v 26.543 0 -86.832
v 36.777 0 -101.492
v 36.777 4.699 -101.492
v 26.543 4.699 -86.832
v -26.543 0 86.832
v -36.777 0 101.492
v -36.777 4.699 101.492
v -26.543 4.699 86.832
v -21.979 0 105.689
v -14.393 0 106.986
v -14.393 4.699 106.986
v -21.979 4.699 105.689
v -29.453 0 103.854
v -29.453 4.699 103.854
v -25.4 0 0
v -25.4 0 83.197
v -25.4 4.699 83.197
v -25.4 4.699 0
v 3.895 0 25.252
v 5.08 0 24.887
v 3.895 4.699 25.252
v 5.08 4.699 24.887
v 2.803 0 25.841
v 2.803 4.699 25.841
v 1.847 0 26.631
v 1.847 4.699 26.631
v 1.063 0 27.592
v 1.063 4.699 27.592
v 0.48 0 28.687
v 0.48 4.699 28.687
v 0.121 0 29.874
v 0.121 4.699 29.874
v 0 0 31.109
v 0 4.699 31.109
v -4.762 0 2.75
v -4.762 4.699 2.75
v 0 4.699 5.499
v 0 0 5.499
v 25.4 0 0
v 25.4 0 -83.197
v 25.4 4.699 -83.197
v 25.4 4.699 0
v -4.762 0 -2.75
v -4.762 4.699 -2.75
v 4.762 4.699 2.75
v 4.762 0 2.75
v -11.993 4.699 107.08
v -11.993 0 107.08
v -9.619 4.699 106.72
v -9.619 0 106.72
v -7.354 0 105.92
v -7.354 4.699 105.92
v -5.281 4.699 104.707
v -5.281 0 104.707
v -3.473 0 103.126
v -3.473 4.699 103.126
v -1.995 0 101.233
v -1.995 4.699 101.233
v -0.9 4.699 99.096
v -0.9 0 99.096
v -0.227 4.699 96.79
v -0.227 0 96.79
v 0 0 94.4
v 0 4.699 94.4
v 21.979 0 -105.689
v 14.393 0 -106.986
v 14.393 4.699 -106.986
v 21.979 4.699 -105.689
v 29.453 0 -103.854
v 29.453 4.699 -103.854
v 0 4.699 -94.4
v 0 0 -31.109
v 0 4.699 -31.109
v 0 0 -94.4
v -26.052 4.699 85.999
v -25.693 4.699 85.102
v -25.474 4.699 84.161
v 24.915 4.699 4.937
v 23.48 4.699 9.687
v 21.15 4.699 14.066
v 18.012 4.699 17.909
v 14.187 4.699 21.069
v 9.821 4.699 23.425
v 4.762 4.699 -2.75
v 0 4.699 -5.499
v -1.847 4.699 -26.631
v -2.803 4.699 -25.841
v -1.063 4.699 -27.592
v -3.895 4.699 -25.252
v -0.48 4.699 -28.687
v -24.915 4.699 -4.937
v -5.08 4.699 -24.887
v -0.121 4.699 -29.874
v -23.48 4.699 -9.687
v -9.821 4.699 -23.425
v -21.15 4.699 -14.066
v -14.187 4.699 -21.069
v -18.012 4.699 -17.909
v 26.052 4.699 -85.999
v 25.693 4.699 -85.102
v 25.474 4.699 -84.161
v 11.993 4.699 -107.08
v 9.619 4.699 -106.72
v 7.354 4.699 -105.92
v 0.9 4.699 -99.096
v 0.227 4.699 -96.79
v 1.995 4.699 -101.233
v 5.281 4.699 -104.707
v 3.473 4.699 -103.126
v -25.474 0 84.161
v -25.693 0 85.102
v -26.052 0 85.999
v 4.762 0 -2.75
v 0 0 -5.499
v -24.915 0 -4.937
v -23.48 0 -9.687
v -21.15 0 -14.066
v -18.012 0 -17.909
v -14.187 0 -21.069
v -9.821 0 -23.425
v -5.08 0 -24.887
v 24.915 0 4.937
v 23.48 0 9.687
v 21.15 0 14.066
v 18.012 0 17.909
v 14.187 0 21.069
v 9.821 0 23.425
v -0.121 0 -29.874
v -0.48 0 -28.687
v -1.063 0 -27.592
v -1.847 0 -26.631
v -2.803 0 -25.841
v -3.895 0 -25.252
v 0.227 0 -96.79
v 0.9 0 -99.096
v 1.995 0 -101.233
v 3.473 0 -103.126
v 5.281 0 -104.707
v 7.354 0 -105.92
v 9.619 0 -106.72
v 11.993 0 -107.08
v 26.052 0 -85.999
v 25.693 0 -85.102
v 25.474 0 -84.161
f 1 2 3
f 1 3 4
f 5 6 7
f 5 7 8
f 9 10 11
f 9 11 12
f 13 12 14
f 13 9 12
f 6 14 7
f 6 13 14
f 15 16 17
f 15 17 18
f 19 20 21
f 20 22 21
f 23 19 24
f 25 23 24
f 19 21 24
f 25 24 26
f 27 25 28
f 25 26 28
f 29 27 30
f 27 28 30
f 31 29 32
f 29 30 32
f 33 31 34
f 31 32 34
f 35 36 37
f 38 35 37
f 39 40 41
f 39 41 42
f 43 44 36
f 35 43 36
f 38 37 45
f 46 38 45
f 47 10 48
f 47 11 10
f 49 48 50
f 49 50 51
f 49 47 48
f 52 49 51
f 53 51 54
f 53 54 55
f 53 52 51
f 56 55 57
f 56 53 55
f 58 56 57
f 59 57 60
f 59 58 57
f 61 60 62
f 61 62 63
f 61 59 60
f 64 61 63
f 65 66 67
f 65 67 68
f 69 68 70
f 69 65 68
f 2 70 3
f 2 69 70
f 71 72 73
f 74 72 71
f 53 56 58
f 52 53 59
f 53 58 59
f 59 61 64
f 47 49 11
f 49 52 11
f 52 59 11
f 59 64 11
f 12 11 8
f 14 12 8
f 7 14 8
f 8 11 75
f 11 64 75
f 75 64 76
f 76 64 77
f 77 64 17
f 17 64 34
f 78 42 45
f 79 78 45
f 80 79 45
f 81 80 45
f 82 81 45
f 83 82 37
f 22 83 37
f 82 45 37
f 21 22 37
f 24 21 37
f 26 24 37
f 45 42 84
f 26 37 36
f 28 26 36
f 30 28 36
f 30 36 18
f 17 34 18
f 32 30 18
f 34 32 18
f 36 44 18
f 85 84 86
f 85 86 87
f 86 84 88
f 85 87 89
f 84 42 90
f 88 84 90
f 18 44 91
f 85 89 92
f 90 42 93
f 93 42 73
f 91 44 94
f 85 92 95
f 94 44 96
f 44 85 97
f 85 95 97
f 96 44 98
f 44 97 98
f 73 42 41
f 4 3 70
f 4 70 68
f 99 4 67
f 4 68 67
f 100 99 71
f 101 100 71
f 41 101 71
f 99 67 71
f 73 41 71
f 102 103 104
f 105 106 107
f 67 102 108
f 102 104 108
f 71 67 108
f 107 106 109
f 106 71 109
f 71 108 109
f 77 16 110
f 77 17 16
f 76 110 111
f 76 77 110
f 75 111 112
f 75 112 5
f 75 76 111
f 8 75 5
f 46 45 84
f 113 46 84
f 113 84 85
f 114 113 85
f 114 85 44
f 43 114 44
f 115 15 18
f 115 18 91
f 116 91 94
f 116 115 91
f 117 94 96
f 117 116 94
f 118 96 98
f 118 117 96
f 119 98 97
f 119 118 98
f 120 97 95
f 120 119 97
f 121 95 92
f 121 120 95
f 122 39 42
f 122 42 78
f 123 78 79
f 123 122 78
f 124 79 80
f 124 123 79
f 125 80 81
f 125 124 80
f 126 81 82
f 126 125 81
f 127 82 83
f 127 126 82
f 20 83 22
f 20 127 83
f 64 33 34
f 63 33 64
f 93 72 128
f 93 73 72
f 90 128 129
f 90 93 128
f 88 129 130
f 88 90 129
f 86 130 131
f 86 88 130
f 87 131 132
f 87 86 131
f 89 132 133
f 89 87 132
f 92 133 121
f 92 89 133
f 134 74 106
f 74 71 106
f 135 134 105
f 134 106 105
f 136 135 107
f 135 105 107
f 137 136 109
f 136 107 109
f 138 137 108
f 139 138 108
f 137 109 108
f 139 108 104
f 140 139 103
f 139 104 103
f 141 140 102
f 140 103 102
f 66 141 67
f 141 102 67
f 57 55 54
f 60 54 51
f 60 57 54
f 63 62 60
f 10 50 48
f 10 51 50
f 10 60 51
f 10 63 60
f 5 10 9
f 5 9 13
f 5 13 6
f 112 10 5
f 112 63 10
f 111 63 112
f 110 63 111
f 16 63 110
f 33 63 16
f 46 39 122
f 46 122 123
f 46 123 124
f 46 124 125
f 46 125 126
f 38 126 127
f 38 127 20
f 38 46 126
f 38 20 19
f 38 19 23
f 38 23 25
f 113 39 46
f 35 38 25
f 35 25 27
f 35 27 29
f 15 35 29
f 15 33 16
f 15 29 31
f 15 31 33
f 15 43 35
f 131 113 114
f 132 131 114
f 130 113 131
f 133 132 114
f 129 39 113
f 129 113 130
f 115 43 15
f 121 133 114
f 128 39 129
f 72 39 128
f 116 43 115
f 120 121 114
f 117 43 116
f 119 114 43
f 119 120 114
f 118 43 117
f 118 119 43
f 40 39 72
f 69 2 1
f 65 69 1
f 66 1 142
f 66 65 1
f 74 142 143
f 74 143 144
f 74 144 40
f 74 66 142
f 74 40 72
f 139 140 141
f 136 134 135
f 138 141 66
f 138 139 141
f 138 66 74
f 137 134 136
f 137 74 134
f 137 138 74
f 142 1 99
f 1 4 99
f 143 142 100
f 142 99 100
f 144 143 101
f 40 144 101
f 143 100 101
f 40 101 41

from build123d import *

# Parameters (mm, degrees)
BOSS_EXTRUDE1_DEPTH = 4.699
CUT_EXTRUDE1_REACH  = 116.14
FILLET1_R           = 6.35
FILLET2_R           = 12.7


with BuildPart() as part:
    # Sketch1 → Boss-Extrude1 (new body)
    with BuildSketch(Plane(origin=(0, 0, 0), x_dir=(1, 0, 0), z_dir=(0, 1, 0))):
        with BuildLine():
            Line((0, 25.4), (0, 107.95))
            ThreePointArc((0, 107.95), (18.67009518, 106.323233801), (36.777487633, 101.491964724))
            Line((36.777487633, 101.491964724), (25.4, 85.194189943))
            Line((25.4, 85.194189943), (25.4, 0))
            ThreePointArc((25.4, 0), (17.960512242, -17.960512242), (0, -25.4))
            Line((0, -25.4), (0, -107.95))
            ThreePointArc((0, -107.95), (-18.67009518, -106.323233801), (-36.777487633, -101.491964724))
            Line((-36.777487633, -101.491964724), (-25.4, -85.194189943))
            Line((-25.4, -85.194189943), (-25.4, 0))
            ThreePointArc((-25.4, 0), (-17.960512242, 17.960512242), (0, 25.4))
        make_face()
    extrude(amount=BOSS_EXTRUDE1_DEPTH)

    # Sketch2 → Cut-Extrude1 (cut, up to next)
    with BuildSketch(Plane(origin=(0, 4.699, 0), x_dir=(1, 0, 0), z_dir=(0, 1, 0)), mode=Mode.PRIVATE) as cut_extrude1_sk1:
        Polygon((0, 5.499261314), (-4.7625, 2.749630657), (-4.7625, -2.749630657), (0, -5.499261314), (4.7625, -2.749630657), (4.7625, 2.749630657), align=None)
    cut_extrude1_tool1 = extrude(cut_extrude1_sk1.sketch, amount=-CUT_EXTRUDE1_REACH, mode=Mode.PRIVATE) & part.part
    add(cut_extrude1_tool1.solids().sort_by_distance((0, 4.699, 0))[0], mode=Mode.SUBTRACT)

    # Fillet1
    fillet1_edges = [part.edges().sort_by_distance(p)[0] for p in [
        (0, 2.3495, -25.4),
        (25.4, 2.3495, -85.194189943),
        (0, 2.3495, 25.4),
        (-25.4, 2.3495, 85.194189943),
    ]]
    fillet(fillet1_edges, radius=FILLET1_R)

    # Fillet2
    fillet2_edges = [part.edges().sort_by_distance(p)[0] for p in [
        (0, 2.3495, -107.95),
        (0, 2.3495, 107.95),
    ]]
    fillet(fillet2_edges, radius=FILLET2_R)


solid = part.part
